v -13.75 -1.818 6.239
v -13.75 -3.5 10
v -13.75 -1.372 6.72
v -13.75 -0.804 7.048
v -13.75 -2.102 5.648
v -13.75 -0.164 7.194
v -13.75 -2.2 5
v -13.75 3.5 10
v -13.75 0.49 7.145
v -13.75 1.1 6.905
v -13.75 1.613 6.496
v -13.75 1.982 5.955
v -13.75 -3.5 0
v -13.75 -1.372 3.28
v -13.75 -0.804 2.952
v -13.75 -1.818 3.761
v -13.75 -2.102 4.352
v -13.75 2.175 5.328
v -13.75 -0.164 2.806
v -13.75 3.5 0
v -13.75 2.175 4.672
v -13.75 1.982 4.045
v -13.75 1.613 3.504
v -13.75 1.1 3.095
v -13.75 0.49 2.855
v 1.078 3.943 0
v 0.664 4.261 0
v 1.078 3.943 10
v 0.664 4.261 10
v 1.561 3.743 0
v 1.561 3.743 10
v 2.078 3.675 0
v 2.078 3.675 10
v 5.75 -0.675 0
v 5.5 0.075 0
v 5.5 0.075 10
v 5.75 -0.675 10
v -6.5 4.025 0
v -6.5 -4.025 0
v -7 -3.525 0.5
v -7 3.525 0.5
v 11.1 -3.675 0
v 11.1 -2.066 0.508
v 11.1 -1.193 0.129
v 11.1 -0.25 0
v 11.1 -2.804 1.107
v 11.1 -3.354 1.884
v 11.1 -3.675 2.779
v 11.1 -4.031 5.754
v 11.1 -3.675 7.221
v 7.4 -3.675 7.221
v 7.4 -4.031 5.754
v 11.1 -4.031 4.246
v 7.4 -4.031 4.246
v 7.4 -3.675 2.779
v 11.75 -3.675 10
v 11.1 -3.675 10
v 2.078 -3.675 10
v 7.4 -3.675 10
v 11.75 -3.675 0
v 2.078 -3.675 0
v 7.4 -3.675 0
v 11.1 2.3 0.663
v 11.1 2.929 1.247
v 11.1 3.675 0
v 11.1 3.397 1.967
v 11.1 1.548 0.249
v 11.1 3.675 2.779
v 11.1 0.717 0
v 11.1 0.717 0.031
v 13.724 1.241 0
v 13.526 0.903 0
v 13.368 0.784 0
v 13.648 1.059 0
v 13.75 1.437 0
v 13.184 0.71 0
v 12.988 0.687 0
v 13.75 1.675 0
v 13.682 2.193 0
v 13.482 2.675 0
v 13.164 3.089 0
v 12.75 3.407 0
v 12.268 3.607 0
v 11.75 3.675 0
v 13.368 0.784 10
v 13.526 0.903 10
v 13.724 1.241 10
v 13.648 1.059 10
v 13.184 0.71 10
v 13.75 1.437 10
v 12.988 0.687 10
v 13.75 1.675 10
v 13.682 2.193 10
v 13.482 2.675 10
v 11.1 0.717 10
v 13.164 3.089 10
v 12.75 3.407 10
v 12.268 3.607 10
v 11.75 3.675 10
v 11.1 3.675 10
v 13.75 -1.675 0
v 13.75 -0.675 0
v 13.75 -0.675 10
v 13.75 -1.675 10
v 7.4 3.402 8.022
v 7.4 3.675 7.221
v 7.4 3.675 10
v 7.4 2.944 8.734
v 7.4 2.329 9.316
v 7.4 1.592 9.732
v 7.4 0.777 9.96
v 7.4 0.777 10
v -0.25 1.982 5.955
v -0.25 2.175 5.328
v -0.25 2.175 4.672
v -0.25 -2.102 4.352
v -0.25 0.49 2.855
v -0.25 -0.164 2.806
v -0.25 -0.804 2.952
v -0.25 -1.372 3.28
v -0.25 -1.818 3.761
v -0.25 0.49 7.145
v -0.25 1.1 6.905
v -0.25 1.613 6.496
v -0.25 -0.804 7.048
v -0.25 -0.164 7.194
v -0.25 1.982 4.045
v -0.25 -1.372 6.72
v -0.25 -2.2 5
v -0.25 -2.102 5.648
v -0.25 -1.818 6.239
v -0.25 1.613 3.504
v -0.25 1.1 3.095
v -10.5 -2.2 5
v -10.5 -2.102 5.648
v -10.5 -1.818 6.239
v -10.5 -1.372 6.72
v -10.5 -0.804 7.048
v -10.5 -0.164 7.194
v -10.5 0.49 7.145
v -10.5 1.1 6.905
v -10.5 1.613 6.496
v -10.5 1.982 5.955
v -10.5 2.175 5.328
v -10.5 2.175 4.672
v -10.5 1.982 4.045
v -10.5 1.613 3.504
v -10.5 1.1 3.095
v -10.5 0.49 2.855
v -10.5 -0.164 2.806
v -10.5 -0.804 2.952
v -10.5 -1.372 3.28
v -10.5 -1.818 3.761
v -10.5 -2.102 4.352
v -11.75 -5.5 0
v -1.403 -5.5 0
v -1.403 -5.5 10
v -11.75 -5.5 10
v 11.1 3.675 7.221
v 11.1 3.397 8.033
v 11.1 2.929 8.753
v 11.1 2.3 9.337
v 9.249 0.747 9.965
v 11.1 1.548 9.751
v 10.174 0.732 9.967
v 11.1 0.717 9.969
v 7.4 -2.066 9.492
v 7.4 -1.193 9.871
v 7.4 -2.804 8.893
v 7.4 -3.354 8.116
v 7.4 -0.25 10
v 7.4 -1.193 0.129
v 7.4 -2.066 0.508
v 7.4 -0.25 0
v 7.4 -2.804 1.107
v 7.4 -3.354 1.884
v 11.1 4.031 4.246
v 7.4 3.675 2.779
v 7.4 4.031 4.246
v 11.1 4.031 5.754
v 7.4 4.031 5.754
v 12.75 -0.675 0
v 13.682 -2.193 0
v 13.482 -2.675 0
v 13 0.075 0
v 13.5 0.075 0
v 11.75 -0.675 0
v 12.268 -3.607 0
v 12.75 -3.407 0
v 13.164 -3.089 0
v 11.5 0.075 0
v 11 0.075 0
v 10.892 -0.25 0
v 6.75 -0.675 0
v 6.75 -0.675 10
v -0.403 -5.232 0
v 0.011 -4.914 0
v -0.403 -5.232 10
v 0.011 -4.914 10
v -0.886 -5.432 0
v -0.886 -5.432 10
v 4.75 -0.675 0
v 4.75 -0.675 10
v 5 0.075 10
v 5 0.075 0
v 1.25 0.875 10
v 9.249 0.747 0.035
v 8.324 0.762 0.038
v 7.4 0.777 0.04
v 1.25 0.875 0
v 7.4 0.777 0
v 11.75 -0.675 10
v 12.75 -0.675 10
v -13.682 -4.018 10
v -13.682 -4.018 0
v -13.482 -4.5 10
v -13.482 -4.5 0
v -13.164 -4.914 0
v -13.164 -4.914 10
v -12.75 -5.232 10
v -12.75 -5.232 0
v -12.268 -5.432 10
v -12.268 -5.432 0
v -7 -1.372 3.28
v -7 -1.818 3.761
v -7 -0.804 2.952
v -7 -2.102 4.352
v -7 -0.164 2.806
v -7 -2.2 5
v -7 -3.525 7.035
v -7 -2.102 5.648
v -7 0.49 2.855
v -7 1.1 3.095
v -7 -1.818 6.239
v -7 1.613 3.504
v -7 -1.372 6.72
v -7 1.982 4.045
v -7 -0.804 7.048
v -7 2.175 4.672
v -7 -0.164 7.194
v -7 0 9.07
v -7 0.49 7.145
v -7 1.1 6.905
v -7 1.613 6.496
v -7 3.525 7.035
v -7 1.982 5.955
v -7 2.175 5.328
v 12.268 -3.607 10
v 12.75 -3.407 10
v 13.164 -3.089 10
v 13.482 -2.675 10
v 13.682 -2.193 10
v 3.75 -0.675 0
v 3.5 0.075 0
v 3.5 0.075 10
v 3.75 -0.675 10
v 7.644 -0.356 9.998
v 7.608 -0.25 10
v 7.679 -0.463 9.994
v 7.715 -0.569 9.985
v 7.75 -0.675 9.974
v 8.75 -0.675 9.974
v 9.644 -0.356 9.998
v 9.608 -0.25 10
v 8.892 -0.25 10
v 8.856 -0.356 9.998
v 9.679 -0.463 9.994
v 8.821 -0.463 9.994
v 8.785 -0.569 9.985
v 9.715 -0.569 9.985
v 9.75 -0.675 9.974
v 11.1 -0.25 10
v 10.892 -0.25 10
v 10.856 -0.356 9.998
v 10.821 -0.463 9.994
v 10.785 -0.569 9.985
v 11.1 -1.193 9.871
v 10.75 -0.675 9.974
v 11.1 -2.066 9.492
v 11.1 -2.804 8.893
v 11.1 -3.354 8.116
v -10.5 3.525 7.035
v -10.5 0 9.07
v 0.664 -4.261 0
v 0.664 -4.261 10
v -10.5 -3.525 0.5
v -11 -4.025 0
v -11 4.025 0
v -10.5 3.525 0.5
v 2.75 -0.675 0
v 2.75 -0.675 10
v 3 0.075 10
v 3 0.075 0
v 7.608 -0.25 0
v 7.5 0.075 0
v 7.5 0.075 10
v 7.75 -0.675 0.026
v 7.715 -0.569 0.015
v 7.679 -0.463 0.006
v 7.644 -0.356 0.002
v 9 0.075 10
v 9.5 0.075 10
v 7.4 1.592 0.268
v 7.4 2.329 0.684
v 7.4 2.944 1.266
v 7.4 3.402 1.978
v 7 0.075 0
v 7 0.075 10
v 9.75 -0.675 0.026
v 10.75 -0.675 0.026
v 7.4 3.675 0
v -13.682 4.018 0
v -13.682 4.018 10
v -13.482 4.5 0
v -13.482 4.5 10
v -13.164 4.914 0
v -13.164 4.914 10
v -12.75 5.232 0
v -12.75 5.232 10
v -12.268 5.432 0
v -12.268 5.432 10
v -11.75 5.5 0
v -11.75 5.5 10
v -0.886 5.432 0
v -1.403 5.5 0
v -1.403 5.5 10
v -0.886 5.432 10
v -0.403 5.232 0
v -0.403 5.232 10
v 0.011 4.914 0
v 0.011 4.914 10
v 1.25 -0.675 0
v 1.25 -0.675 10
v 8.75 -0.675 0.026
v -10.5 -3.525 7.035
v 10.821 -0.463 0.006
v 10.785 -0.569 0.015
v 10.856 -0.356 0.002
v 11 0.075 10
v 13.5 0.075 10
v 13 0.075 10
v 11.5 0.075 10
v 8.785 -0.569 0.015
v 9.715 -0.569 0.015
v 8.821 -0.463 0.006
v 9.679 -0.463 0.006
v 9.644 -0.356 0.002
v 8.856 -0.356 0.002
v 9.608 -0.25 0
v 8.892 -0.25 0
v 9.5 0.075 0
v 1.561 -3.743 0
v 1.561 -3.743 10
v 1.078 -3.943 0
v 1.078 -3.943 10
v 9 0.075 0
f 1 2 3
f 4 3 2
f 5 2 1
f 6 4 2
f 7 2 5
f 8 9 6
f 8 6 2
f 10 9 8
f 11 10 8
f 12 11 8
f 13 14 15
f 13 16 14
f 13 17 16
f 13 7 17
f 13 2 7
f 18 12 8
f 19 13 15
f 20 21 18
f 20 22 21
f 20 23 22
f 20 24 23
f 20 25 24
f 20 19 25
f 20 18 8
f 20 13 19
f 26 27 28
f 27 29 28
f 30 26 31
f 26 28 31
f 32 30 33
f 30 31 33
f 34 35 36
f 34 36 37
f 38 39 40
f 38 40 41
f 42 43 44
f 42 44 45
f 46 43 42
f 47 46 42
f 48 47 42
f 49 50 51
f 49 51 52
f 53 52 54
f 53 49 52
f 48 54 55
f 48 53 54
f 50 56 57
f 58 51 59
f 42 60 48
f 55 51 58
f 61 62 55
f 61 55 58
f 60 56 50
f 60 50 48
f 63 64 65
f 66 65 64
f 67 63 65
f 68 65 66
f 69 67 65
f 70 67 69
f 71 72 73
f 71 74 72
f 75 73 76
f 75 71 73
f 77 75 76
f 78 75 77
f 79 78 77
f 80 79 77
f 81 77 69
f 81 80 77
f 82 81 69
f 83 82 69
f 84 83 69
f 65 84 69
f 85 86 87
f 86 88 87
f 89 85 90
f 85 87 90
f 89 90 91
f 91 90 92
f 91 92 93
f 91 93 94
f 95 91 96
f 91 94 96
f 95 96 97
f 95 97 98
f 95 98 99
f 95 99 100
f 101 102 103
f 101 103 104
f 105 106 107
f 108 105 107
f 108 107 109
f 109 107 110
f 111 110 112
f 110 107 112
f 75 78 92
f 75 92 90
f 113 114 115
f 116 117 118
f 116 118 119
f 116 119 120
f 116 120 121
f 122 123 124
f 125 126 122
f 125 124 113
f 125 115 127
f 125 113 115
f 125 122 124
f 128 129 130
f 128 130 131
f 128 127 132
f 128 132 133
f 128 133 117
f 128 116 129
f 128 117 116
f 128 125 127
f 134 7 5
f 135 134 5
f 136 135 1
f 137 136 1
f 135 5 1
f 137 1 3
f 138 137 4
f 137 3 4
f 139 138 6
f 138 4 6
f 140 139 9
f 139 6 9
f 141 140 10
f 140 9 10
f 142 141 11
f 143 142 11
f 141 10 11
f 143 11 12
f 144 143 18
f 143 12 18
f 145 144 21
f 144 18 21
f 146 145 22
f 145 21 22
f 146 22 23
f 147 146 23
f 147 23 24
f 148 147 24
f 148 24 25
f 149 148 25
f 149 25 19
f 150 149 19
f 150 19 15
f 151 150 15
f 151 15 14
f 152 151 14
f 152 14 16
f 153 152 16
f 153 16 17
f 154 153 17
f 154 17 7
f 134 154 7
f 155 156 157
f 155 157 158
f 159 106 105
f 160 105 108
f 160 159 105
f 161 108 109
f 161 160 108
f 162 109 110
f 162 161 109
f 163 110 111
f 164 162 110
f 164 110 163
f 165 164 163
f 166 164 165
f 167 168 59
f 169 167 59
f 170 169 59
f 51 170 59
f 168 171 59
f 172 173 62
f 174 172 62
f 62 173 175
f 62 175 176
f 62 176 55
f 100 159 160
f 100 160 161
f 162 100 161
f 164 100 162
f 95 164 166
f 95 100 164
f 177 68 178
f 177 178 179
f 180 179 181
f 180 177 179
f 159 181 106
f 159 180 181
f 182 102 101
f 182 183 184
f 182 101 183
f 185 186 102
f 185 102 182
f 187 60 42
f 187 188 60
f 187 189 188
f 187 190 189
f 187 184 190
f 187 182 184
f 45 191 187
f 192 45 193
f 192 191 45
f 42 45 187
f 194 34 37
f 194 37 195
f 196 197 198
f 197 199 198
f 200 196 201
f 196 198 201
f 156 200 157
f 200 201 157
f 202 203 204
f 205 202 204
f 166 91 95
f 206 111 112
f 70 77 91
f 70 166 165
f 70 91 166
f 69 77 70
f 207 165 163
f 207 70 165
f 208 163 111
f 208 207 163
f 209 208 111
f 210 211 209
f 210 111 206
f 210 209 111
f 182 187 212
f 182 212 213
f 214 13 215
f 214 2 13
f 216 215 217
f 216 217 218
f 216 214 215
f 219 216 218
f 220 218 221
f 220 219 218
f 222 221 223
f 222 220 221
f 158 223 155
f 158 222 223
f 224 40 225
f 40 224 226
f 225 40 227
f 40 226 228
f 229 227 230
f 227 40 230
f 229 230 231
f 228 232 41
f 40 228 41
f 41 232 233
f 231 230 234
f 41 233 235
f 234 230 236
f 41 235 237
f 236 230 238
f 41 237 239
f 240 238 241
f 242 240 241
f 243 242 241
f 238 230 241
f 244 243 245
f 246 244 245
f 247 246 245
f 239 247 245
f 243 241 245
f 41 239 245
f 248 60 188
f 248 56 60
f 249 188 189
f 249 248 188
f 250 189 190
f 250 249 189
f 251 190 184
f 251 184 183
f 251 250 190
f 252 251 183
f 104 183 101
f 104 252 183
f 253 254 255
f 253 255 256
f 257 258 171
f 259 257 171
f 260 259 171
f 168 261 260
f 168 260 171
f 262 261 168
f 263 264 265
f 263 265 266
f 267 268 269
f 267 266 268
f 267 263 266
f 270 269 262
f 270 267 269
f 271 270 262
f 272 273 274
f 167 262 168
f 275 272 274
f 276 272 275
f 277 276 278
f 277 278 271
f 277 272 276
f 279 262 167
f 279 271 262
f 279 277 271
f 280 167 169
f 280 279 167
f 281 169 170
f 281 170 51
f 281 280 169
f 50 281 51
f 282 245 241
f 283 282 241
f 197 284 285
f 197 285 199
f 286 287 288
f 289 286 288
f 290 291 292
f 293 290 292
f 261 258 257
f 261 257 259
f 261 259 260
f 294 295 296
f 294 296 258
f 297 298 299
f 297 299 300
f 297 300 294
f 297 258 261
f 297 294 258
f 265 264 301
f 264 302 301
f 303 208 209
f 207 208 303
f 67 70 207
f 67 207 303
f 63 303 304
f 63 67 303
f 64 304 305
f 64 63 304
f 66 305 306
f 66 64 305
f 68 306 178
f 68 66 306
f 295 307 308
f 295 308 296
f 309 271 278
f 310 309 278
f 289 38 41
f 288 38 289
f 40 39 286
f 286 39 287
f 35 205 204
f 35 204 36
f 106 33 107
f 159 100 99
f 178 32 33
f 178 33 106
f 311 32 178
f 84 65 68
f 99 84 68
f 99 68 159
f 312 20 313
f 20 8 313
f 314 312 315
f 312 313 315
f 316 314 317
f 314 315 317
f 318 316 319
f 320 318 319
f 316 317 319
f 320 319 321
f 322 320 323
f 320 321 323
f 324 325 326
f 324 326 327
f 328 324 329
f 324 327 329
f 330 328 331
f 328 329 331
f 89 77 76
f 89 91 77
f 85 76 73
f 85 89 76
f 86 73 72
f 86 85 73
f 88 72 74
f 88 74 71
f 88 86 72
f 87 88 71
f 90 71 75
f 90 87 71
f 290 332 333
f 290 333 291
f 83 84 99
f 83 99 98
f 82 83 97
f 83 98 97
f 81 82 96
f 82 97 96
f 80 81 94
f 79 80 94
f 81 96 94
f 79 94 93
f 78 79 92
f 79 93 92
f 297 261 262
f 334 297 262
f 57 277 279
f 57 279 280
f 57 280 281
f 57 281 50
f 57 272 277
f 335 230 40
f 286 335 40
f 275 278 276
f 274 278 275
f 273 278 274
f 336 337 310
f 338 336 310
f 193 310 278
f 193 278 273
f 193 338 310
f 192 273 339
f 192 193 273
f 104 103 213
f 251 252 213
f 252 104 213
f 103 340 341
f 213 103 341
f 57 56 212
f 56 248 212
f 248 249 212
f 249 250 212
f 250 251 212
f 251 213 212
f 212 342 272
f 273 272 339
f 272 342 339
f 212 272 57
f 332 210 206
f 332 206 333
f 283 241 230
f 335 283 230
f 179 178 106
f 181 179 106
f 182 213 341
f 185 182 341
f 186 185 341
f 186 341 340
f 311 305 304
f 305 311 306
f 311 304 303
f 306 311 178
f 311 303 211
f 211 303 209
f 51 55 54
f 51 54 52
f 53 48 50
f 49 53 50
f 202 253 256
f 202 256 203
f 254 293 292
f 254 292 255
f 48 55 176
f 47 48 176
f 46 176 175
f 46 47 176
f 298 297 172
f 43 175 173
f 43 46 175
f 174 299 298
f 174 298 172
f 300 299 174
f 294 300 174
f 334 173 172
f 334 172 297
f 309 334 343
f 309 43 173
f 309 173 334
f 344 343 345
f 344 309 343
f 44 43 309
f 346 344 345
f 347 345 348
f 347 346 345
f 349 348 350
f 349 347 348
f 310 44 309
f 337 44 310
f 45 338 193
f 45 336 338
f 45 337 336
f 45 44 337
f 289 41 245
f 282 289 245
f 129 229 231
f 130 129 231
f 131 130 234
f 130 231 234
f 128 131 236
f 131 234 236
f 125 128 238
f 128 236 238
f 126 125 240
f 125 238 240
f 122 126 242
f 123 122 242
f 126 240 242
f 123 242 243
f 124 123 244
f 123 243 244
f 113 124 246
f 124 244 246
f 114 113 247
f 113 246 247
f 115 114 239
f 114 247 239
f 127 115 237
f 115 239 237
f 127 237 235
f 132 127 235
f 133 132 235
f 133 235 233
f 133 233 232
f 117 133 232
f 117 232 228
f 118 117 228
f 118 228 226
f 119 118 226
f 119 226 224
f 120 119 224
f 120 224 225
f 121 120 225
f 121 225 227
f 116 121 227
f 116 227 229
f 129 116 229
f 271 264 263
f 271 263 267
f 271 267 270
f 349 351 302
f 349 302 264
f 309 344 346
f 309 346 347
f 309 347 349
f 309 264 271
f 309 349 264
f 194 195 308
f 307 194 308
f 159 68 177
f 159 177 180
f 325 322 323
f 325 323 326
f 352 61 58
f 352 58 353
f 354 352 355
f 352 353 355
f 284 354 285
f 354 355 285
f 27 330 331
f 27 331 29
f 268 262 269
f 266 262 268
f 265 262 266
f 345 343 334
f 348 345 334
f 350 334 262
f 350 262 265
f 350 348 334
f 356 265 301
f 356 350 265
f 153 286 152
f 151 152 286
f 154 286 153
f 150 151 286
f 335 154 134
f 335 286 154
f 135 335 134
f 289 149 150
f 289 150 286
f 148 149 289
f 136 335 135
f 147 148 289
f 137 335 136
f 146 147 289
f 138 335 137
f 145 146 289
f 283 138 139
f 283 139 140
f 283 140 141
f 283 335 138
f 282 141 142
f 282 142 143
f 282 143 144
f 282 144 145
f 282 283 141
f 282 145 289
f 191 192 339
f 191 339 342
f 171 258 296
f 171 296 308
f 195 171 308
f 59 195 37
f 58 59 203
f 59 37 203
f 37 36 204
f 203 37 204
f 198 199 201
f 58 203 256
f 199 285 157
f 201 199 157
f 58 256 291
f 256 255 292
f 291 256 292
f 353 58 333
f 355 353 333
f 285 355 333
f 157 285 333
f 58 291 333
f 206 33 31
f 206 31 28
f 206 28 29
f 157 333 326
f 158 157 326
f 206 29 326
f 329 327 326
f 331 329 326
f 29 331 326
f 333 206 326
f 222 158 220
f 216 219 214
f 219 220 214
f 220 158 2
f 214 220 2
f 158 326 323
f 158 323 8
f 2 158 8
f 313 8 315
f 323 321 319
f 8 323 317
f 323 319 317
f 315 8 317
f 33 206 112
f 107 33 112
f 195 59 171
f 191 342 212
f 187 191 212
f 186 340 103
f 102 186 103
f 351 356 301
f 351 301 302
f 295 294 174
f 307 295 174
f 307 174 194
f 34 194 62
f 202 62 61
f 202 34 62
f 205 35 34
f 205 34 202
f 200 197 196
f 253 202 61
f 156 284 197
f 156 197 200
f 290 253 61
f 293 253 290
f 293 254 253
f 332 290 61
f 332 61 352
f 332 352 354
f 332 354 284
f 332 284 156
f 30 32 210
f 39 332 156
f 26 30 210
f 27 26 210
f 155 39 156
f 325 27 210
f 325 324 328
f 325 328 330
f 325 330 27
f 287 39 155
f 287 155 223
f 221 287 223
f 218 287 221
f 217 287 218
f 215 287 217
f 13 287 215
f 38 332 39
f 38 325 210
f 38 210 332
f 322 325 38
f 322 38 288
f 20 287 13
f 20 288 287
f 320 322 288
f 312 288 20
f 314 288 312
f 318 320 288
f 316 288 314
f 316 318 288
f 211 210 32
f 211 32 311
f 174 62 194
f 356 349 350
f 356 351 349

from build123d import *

# Parameters (mm, degrees)
PAD002_DEPTH    = 3.7
PAD001_DEPTH    = 3.5
PAD_DEPTH       = 10
SKETCH001_R     = 2.2
POCKET_DEPTH    = 13.5
CHAMFER_SIZE    = 0.5
FILLET_R        = 2
FILLET001_R     = 0.75
SKETCH004_W     = 3.7
SKETCH004_H     = 4.441354
PAD003_DEPTH    = 2
POCKET001_DEPTH = 3.7
SKETCH006_W     = 3.7
SKETCH006_H     = 4.441354
PAD004_DEPTH    = 2
POCKET002_DEPTH = 3.7


with BuildPart() as pad002:
    # Sketch003 → Pad002 (new body)
    with BuildSketch(Plane.YZ.offset(11.1)):
        with BuildLine():
            Line((-1.31066, 11.5), (1.31066, 11.5))
            ThreePointArc((5.25, 7.56066), (4.096194, 10.346194), (1.31066, 11.5))
            Line((5.25, 7.56066), (5.25, 2.43934))
            ThreePointArc((1.31066, -1.5), (4.096194, -0.346194), (5.25, 2.43934))
            Line((1.31066, -1.5), (-1.31066, -1.5))
            ThreePointArc((-5.25, 2.43934), (-4.096194, -0.346194), (-1.31066, -1.5))
            Line((-5.25, 2.43934), (-5.25, 7.56066))
            ThreePointArc((-1.31066, 11.5), (-4.096194, 10.346194), (-5.25, 7.56066))
        make_face()
        with BuildLine():
            Line((-0.25, 10), (0.25, 10))
            ThreePointArc((3.75, 6.5), (2.724874, 8.974874), (0.25, 10))
            Line((3.75, 6.5), (3.75, 3.5))
            ThreePointArc((0.25, 0), (2.724874, 1.025126), (3.75, 3.5))
            Line((0.25, 0), (-0.25, 0))
            ThreePointArc((-3.75, 3.5), (-2.724874, 1.025126), (-0.25, 0))
            Line((-3.75, 3.5), (-3.75, 6.5))
            ThreePointArc((-0.25, 10), (-2.724874, 8.974874), (-3.75, 6.5))
        make_face(mode=Mode.SUBTRACT)
    extrude(amount=-PAD002_DEPTH)


with BuildPart() as pad001:
    # Sketch002 → Pad001 (new body)
    with BuildSketch(Plane.YZ.offset(-7)):
        Polygon((3.525, 2.96484), (3.525, 7.03516), (0, 9.070319), (-3.525, 7.03516), (-3.525, 2.96484), (-3.525, 0), (3.525, 0), align=None)
    extrude(amount=-PAD001_DEPTH)


with BuildPart() as pocket002:
    # Sketch → Pad (new body)
    with BuildSketch(Plane.XY):
        Polygon((2.75, -0.675), (3, 0.075), (3.5, 0.075), (3.75, -0.675), (4.75, -0.675), (5, 0.075), (5.5, 0.075), (5.75, -0.675), (6.75, -0.675), (7, 0.075), (7.5, 0.075), (7.75, -0.675), (8.75, -0.675), (9, 0.075), (9.5, 0.075), (9.75, -0.675), (10.75, -0.675), (11, 0.075), (11.5, 0.075), (11.75, -0.675), (12.75, -0.675), (13, 0.075), (13.5, 0.075), (13.75, -0.675), (13.75, -3.675), (1.25, -3.675), (-0.575, -5.5), (-13.75, -5.5), (-13.75, 5.5), (-0.575, 5.5), (1.25, 3.675), (13.75, 3.675), (13.75, 0.675), (1.25, 0.875), (1.25, -0.675), align=None)
    extrude(amount=PAD_DEPTH)

    # Sketch001 → Pocket (cut)
    with BuildSketch(Plane(origin=(-13.75, 0, 0), x_dir=(0, -1, 0), z_dir=(-1, 0, 0))):
        with Locations((0, 5)):
            Circle(SKETCH001_R)
    extrude(amount=-POCKET_DEPTH, mode=Mode.SUBTRACT)

    # Cut: cut Pad001
    add(pad001.part, mode=Mode.SUBTRACT)

    # Cut001: cut Pad002
    add(pad002.part, mode=Mode.SUBTRACT)

    # Chamfer
    chamfer_edges = [pocket002.edges().sort_by_distance(p)[0] for p in [
        (-7, 0, 0),
        (-8.75, -3.525, 0),
        (-10.5, 0, 0),
        (-8.75, 3.525, 0),
    ]]
    chamfer(chamfer_edges, length=CHAMFER_SIZE)

    # Fillet
    fillet_edges = [pocket002.edges().sort_by_distance(p)[0] for p in [
        (13.75, 3.675, 5),
        (1.25, 3.675, 5),
        (-0.575, 5.5, 5),
        (-13.75, 5.5, 5),
        (13.75, -3.675, 5),
        (1.25, -3.675, 5),
        (-0.575, -5.5, 5),
        (-13.75, -5.5, 5),
    ]]
    fillet(fillet_edges, radius=FILLET_R)

    # Fillet001
    fillet001_edges = [pocket002.edges().sort_by_distance(p)[0] for p in [
        (13.75, 0.675, 5),
    ]]
    fillet(fillet001_edges, radius=FILLET001_R)

    # Sketch004 → Pad003 (new body)
    with BuildSketch(Plane.XZ.offset(3.675)):
        with Locations((9.25, 5)):
            Rectangle(SKETCH004_W, SKETCH004_H)
    extrude(amount=PAD003_DEPTH)

    # Sketch005 → Pocket001 (cut)
    with BuildSketch(Plane.YZ.offset(11.1)):
        with BuildLine():
            ThreePointArc((-3.675, 7.220677), (-4.075959, 5), (-3.675, 2.779323))
            Line((-3.675, 2.779323), (-5.675, 2.779323))
            Line((-5.675, 2.779323), (-5.675, 7.220677))
            Line((-5.675, 7.220677), (-3.675, 7.220677))
        make_face()
    extrude(amount=-POCKET001_DEPTH, mode=Mode.SUBTRACT)

    # Sketch006 → Pad004 (new body)
    with BuildSketch(Plane(origin=(0, 3.675, 0), x_dir=(-1, 0, 0), z_dir=(0, 1, 0))):
        with Locations((-9.25, 5)):
            Rectangle(SKETCH006_W, SKETCH006_H)
    extrude(amount=PAD004_DEPTH)

    # Sketch007 → Pocket002 (cut)
    with BuildSketch(Plane.YZ.offset(11.1)):
        with BuildLine():
            ThreePointArc((3.675, 2.779323), (4.075959, 5), (3.675, 7.220677))
            Line((3.675, 7.220677), (5.675, 7.220677))
            Line((5.675, 7.220677), (5.675, 2.779323))
            Line((5.675, 2.779323), (3.675, 2.779323))
        make_face()
    extrude(amount=-POCKET002_DEPTH, mode=Mode.SUBTRACT)


solid = pocket002.part
